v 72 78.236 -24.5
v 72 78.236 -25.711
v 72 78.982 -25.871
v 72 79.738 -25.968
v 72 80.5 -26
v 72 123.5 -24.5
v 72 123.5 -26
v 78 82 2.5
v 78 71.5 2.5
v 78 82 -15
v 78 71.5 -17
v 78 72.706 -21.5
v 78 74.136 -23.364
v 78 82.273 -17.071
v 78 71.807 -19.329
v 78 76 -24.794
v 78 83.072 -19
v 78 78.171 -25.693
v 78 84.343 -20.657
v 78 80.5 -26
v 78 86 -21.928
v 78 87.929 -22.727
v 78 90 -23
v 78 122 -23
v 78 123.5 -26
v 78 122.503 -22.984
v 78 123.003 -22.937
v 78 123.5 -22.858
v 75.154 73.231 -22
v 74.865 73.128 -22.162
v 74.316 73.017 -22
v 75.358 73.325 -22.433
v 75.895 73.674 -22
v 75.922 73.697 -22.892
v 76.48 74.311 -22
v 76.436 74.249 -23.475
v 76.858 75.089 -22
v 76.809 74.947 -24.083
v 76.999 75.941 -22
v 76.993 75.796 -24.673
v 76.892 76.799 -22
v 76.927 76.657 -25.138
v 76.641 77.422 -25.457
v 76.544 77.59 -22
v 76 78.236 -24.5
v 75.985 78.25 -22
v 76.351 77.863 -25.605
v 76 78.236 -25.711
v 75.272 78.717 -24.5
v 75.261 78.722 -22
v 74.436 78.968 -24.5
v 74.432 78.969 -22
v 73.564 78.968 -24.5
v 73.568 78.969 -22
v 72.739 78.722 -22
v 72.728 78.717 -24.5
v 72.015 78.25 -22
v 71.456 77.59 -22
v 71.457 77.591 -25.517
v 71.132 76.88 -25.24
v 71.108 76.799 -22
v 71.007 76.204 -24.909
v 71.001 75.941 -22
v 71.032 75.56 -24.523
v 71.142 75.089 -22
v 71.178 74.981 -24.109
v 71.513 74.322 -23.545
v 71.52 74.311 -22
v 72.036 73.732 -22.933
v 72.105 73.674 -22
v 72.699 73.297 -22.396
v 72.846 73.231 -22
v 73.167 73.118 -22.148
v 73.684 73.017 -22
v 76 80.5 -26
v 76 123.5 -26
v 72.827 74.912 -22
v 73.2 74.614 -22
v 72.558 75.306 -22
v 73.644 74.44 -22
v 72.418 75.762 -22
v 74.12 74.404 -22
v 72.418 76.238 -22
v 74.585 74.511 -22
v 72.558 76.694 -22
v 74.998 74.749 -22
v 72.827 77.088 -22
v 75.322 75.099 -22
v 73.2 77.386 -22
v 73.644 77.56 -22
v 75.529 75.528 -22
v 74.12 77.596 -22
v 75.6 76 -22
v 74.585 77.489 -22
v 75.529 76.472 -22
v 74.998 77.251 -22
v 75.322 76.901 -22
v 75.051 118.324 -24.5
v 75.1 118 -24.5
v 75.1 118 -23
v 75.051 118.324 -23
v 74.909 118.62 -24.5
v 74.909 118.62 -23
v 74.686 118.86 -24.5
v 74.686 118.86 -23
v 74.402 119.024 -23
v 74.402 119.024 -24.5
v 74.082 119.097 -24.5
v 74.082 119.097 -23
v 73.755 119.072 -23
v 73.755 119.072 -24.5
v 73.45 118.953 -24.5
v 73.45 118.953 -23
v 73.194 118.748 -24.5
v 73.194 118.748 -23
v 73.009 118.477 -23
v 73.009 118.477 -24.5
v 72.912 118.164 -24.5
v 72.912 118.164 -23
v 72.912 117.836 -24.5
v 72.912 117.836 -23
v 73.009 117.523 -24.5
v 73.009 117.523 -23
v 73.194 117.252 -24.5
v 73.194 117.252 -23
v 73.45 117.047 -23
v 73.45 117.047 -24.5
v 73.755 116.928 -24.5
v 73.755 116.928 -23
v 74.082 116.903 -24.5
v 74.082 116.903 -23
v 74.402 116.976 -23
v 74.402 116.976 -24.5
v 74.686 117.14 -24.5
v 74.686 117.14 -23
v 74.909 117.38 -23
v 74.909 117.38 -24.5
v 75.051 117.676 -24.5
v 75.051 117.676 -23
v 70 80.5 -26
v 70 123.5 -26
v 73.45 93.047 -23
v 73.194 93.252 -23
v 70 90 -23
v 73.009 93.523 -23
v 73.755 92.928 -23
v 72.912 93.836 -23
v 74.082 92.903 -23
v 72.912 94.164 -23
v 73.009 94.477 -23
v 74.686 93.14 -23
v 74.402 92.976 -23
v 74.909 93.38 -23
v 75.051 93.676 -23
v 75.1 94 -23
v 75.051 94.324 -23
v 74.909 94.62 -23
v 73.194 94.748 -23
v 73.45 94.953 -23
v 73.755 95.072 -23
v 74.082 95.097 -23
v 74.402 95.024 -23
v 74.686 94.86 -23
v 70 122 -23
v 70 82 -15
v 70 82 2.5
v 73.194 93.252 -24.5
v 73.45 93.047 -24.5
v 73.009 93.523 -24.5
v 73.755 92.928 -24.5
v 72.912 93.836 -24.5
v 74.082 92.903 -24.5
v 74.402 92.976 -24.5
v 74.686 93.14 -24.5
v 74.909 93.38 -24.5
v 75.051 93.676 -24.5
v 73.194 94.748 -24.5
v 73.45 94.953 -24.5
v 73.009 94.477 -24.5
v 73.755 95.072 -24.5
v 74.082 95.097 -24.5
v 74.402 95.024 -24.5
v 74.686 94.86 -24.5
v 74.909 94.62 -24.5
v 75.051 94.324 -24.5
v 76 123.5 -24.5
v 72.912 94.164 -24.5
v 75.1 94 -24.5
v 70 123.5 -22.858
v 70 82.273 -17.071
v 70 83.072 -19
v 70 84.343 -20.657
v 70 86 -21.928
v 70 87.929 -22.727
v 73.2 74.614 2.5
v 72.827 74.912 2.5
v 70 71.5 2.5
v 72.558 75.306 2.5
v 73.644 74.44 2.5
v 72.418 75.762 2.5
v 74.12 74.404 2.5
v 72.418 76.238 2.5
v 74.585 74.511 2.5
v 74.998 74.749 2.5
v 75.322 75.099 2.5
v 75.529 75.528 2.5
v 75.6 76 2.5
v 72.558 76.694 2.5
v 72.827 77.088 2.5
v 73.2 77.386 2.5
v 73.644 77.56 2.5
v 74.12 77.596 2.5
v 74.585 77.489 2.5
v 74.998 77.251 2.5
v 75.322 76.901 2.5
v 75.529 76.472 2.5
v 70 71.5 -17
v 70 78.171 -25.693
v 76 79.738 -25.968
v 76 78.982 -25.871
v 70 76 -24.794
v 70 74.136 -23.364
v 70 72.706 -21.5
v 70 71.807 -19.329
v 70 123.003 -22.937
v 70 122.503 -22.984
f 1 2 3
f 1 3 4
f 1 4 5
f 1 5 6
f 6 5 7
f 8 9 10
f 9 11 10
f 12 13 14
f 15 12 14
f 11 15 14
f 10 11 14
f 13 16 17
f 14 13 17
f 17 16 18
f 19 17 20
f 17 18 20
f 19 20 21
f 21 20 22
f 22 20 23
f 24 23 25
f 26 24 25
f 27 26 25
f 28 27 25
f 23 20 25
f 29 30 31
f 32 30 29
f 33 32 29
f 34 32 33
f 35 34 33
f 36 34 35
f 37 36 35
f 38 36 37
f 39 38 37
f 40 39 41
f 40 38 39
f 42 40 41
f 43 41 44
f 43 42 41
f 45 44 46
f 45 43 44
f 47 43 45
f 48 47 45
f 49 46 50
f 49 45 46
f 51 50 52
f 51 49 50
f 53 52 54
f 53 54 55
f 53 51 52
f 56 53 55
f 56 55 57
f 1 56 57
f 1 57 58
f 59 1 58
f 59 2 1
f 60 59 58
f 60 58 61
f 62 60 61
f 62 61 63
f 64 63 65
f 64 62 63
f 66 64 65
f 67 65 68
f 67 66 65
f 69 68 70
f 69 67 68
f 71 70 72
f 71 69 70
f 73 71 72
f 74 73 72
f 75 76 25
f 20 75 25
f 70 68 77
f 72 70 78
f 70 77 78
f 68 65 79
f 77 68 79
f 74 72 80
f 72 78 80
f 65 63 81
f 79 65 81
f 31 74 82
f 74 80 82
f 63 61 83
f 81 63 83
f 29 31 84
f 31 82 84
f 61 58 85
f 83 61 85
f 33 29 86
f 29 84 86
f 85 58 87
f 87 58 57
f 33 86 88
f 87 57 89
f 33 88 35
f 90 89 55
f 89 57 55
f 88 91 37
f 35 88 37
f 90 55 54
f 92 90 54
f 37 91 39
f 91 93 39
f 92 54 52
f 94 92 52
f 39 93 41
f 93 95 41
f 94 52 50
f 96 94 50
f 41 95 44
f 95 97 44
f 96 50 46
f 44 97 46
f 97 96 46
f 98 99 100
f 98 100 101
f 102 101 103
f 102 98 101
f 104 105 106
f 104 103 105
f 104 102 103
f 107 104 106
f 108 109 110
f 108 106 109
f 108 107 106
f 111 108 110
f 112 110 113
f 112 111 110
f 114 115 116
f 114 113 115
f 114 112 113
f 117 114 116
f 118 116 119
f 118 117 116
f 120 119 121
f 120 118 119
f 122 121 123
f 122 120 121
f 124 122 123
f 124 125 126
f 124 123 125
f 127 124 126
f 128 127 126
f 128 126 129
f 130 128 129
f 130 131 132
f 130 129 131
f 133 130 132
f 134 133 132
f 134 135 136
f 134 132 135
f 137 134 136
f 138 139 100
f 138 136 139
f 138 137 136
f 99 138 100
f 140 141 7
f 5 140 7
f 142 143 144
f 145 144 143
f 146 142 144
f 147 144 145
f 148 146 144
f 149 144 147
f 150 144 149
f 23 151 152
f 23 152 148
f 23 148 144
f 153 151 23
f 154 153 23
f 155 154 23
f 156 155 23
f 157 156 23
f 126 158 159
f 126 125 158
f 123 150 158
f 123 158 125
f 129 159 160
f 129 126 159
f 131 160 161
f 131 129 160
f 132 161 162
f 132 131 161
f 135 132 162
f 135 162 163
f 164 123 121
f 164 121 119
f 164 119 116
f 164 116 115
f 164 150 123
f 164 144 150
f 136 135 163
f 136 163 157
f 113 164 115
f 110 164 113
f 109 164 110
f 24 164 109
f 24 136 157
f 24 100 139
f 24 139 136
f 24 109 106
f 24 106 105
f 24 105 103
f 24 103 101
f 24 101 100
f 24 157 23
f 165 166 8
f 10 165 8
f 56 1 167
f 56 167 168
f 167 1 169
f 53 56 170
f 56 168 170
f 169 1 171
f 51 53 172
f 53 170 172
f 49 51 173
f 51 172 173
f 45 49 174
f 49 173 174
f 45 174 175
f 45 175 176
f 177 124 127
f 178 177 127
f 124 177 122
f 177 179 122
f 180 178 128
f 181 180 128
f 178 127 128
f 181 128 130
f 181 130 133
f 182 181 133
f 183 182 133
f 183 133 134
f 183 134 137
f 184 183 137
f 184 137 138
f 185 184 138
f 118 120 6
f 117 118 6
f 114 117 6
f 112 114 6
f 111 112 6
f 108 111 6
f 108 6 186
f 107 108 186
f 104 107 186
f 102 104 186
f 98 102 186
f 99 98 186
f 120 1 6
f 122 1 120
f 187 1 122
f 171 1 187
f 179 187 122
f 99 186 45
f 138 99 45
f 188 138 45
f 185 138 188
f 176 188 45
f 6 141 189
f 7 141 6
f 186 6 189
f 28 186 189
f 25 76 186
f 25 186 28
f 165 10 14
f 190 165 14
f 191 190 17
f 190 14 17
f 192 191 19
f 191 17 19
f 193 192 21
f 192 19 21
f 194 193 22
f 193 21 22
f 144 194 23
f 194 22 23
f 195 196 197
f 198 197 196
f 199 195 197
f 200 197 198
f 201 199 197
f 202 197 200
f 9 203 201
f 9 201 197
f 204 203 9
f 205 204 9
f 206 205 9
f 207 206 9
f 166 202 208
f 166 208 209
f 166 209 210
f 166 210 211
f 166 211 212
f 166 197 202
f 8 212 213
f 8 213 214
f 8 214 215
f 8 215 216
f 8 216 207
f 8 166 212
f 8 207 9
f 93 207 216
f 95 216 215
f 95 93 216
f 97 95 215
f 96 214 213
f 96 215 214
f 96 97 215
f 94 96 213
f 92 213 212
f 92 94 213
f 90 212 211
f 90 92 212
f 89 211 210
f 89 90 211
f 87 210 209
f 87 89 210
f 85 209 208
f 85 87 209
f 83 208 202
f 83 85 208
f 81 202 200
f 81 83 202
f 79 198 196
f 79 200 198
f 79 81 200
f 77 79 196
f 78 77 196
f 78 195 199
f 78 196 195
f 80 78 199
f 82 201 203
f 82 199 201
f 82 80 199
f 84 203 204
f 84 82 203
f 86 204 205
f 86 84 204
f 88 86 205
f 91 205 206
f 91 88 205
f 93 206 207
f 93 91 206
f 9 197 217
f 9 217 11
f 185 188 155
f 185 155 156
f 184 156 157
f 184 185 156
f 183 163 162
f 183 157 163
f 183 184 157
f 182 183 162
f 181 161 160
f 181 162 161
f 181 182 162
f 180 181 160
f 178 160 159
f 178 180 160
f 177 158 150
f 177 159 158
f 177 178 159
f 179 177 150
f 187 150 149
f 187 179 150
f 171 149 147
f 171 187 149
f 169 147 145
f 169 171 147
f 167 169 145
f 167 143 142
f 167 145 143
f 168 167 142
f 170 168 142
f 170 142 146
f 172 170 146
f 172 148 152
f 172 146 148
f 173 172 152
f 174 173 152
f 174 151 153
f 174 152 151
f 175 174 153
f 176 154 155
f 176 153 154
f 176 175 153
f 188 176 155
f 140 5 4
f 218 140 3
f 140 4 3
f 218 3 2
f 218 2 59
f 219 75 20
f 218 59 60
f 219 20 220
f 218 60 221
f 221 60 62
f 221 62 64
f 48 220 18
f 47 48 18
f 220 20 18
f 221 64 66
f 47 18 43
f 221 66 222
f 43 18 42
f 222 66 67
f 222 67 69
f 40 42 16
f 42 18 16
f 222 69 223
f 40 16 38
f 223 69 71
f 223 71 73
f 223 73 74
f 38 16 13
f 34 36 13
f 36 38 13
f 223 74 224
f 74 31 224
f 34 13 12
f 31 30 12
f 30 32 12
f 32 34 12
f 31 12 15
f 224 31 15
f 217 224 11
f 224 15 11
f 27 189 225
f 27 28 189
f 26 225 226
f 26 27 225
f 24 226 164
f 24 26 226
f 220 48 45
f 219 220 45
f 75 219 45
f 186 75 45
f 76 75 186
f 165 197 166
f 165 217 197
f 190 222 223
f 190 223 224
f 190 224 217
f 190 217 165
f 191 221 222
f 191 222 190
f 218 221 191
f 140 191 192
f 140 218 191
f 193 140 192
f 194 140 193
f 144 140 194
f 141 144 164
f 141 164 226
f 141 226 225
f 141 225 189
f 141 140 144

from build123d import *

# Parameters (mm, degrees)
CYLINDER030_R     = 1.6
CYLINDER030_DEPTH = 28
BOX040_W          = 8
BOX040_H          = 10.5
BOX040_DEPTH      = 2.5
CYLINDER007_R     = 1.1
CYLINDER007_DEPTH = 28
CYLINDER006_R     = 1.1
CYLINDER006_DEPTH = 28
CYLINDER005_R     = 1.6
CYLINDER005_DEPTH = 28
CYLINDER004_R     = 3
CYLINDER004_DEPTH = 4
BOX009_W          = 4
BOX009_H          = 52
BOX009_DEPTH      = 1.5
BOX008_W          = 77
BOX008_H          = 48
BOX008_DEPTH      = 40
FILLET002_R       = 8
BOX005_W          = 8
BOX005_H          = 52
BOX005_DEPTH      = 26
FILLET003_R       = 9


with BuildPart() as cylinder030:
    # Cylinder030 → Cylinder030 (new body)
    with BuildSketch(Plane(origin=(74, 76, -28), x_dir=(1, 0, 0), z_dir=(0, 0, 1))):
        Circle(CYLINDER030_R)
    extrude(amount=CYLINDER030_DEPTH)


with BuildPart() as cut030:
    # Box040 → Box040 (new body)
    with BuildSketch(Plane(origin=(70, 71.5, -26), x_dir=(1, 0, 0), z_dir=(0, 0, 1))):
        with Locations((4, 5.25)):
            Rectangle(BOX040_W, BOX040_H)
    extrude(amount=BOX040_DEPTH)

    # Cut030: cut Cylinder030
    add(cylinder030.part, mode=Mode.SUBTRACT)


with BuildPart() as cut030_1:
    # Cut030 placement: moved
    add(cut030.part.moved(Location((0, 0, 26))))


with BuildPart() as cylinder007:
    # Cylinder007 → Cylinder007 (new body)
    with BuildSketch(Plane(origin=(74, 118, -26), x_dir=(1, 0, 0), z_dir=(0, 0, 1))):
        Circle(CYLINDER007_R)
    extrude(amount=CYLINDER007_DEPTH)


with BuildPart() as fusion007:
    # Cylinder006 → Cylinder006 (new body)
    with BuildSketch(Plane(origin=(74, 94, -26), x_dir=(1, 0, 0), z_dir=(0, 0, 1))):
        Circle(CYLINDER006_R)
    extrude(amount=CYLINDER006_DEPTH)

    # Fusion007: union Cylinder007
    add(cylinder007.part)


with BuildPart() as cylinder005:
    # Cylinder005 → Cylinder005 (new body)
    with BuildSketch(Plane(origin=(74, 79, -26), x_dir=(1, 0, 0), z_dir=(0, 0, 1))):
        Circle(CYLINDER005_R)
    extrude(amount=CYLINDER005_DEPTH)


with BuildPart() as fusion006:
    # Cylinder004 → Cylinder004 (new body)
    with BuildSketch(Plane(origin=(74, 79, -26), x_dir=(1, 0, 0), z_dir=(0, 0, 1))):
        Circle(CYLINDER004_R)
    extrude(amount=CYLINDER004_DEPTH)

    # Fusion006: union Cylinder005
    add(cylinder005.part)


with BuildPart() as fusion006_1:
    # Fusion006 placement: moved
    add(fusion006.part.moved(Location((0, -3, 0))))


with BuildPart() as box009:
    # Box009 → Box009 (new body)
    with BuildSketch(Plane(origin=(72, 71.5, -26), x_dir=(1, 0, 0), z_dir=(0, 0, 1))):
        with Locations((2, 26)):
            Rectangle(BOX009_W, BOX009_H)
    extrude(amount=BOX009_DEPTH)


with BuildPart() as fillet002:
    # Box008 → Box008 (new body)
    with BuildSketch(Plane(origin=(62, 82, -27), x_dir=(1, 0, 0), z_dir=(0, 0, 1))):
        with Locations((38.5, 24)):
            Rectangle(BOX008_W, BOX008_H)
    extrude(amount=BOX008_DEPTH)

    # Fillet002
    fillet002_edges = [fillet002.edges().sort_by_distance(p)[0] for p in [
        (100.5, 82, -27),
        (100.5, 82, 13),
        (100.5, 130, -27),
        (100.5, 130, 13),
    ]]
    fillet(fillet002_edges, radius=FILLET002_R)


with BuildPart() as fillet002_1:
    # Fillet002 placement: moved
    add(fillet002.part.moved(Location((0, 0, 4))))


with BuildPart() as fusion034:
    # Box005 → Box005 (new body)
    with BuildSketch(Plane(origin=(70, 71.5, -26), x_dir=(1, 0, 0), z_dir=(0, 0, 1))):
        with Locations((4, 26)):
            Rectangle(BOX005_W, BOX005_H)
    extrude(amount=BOX005_DEPTH)

    # Cut002: cut Fillet002
    add(fillet002_1.part, mode=Mode.SUBTRACT)

    # Fillet003
    fillet003_edges = [fusion034.edges().sort_by_distance(p)[0] for p in [
        (74, 71.5, -26),
    ]]
    fillet(fillet003_edges, radius=FILLET003_R)

    # Cut003: cut Box009
    add(box009.part, mode=Mode.SUBTRACT)

    # Cut007: cut Fusion006
    add(fusion006_1.part, mode=Mode.SUBTRACT)

    # Cut008: cut Fusion007
    add(fusion007.part, mode=Mode.SUBTRACT)

    # Fusion034: union Cut030
    add(cut030_1.part)


solid = fusion034.part
